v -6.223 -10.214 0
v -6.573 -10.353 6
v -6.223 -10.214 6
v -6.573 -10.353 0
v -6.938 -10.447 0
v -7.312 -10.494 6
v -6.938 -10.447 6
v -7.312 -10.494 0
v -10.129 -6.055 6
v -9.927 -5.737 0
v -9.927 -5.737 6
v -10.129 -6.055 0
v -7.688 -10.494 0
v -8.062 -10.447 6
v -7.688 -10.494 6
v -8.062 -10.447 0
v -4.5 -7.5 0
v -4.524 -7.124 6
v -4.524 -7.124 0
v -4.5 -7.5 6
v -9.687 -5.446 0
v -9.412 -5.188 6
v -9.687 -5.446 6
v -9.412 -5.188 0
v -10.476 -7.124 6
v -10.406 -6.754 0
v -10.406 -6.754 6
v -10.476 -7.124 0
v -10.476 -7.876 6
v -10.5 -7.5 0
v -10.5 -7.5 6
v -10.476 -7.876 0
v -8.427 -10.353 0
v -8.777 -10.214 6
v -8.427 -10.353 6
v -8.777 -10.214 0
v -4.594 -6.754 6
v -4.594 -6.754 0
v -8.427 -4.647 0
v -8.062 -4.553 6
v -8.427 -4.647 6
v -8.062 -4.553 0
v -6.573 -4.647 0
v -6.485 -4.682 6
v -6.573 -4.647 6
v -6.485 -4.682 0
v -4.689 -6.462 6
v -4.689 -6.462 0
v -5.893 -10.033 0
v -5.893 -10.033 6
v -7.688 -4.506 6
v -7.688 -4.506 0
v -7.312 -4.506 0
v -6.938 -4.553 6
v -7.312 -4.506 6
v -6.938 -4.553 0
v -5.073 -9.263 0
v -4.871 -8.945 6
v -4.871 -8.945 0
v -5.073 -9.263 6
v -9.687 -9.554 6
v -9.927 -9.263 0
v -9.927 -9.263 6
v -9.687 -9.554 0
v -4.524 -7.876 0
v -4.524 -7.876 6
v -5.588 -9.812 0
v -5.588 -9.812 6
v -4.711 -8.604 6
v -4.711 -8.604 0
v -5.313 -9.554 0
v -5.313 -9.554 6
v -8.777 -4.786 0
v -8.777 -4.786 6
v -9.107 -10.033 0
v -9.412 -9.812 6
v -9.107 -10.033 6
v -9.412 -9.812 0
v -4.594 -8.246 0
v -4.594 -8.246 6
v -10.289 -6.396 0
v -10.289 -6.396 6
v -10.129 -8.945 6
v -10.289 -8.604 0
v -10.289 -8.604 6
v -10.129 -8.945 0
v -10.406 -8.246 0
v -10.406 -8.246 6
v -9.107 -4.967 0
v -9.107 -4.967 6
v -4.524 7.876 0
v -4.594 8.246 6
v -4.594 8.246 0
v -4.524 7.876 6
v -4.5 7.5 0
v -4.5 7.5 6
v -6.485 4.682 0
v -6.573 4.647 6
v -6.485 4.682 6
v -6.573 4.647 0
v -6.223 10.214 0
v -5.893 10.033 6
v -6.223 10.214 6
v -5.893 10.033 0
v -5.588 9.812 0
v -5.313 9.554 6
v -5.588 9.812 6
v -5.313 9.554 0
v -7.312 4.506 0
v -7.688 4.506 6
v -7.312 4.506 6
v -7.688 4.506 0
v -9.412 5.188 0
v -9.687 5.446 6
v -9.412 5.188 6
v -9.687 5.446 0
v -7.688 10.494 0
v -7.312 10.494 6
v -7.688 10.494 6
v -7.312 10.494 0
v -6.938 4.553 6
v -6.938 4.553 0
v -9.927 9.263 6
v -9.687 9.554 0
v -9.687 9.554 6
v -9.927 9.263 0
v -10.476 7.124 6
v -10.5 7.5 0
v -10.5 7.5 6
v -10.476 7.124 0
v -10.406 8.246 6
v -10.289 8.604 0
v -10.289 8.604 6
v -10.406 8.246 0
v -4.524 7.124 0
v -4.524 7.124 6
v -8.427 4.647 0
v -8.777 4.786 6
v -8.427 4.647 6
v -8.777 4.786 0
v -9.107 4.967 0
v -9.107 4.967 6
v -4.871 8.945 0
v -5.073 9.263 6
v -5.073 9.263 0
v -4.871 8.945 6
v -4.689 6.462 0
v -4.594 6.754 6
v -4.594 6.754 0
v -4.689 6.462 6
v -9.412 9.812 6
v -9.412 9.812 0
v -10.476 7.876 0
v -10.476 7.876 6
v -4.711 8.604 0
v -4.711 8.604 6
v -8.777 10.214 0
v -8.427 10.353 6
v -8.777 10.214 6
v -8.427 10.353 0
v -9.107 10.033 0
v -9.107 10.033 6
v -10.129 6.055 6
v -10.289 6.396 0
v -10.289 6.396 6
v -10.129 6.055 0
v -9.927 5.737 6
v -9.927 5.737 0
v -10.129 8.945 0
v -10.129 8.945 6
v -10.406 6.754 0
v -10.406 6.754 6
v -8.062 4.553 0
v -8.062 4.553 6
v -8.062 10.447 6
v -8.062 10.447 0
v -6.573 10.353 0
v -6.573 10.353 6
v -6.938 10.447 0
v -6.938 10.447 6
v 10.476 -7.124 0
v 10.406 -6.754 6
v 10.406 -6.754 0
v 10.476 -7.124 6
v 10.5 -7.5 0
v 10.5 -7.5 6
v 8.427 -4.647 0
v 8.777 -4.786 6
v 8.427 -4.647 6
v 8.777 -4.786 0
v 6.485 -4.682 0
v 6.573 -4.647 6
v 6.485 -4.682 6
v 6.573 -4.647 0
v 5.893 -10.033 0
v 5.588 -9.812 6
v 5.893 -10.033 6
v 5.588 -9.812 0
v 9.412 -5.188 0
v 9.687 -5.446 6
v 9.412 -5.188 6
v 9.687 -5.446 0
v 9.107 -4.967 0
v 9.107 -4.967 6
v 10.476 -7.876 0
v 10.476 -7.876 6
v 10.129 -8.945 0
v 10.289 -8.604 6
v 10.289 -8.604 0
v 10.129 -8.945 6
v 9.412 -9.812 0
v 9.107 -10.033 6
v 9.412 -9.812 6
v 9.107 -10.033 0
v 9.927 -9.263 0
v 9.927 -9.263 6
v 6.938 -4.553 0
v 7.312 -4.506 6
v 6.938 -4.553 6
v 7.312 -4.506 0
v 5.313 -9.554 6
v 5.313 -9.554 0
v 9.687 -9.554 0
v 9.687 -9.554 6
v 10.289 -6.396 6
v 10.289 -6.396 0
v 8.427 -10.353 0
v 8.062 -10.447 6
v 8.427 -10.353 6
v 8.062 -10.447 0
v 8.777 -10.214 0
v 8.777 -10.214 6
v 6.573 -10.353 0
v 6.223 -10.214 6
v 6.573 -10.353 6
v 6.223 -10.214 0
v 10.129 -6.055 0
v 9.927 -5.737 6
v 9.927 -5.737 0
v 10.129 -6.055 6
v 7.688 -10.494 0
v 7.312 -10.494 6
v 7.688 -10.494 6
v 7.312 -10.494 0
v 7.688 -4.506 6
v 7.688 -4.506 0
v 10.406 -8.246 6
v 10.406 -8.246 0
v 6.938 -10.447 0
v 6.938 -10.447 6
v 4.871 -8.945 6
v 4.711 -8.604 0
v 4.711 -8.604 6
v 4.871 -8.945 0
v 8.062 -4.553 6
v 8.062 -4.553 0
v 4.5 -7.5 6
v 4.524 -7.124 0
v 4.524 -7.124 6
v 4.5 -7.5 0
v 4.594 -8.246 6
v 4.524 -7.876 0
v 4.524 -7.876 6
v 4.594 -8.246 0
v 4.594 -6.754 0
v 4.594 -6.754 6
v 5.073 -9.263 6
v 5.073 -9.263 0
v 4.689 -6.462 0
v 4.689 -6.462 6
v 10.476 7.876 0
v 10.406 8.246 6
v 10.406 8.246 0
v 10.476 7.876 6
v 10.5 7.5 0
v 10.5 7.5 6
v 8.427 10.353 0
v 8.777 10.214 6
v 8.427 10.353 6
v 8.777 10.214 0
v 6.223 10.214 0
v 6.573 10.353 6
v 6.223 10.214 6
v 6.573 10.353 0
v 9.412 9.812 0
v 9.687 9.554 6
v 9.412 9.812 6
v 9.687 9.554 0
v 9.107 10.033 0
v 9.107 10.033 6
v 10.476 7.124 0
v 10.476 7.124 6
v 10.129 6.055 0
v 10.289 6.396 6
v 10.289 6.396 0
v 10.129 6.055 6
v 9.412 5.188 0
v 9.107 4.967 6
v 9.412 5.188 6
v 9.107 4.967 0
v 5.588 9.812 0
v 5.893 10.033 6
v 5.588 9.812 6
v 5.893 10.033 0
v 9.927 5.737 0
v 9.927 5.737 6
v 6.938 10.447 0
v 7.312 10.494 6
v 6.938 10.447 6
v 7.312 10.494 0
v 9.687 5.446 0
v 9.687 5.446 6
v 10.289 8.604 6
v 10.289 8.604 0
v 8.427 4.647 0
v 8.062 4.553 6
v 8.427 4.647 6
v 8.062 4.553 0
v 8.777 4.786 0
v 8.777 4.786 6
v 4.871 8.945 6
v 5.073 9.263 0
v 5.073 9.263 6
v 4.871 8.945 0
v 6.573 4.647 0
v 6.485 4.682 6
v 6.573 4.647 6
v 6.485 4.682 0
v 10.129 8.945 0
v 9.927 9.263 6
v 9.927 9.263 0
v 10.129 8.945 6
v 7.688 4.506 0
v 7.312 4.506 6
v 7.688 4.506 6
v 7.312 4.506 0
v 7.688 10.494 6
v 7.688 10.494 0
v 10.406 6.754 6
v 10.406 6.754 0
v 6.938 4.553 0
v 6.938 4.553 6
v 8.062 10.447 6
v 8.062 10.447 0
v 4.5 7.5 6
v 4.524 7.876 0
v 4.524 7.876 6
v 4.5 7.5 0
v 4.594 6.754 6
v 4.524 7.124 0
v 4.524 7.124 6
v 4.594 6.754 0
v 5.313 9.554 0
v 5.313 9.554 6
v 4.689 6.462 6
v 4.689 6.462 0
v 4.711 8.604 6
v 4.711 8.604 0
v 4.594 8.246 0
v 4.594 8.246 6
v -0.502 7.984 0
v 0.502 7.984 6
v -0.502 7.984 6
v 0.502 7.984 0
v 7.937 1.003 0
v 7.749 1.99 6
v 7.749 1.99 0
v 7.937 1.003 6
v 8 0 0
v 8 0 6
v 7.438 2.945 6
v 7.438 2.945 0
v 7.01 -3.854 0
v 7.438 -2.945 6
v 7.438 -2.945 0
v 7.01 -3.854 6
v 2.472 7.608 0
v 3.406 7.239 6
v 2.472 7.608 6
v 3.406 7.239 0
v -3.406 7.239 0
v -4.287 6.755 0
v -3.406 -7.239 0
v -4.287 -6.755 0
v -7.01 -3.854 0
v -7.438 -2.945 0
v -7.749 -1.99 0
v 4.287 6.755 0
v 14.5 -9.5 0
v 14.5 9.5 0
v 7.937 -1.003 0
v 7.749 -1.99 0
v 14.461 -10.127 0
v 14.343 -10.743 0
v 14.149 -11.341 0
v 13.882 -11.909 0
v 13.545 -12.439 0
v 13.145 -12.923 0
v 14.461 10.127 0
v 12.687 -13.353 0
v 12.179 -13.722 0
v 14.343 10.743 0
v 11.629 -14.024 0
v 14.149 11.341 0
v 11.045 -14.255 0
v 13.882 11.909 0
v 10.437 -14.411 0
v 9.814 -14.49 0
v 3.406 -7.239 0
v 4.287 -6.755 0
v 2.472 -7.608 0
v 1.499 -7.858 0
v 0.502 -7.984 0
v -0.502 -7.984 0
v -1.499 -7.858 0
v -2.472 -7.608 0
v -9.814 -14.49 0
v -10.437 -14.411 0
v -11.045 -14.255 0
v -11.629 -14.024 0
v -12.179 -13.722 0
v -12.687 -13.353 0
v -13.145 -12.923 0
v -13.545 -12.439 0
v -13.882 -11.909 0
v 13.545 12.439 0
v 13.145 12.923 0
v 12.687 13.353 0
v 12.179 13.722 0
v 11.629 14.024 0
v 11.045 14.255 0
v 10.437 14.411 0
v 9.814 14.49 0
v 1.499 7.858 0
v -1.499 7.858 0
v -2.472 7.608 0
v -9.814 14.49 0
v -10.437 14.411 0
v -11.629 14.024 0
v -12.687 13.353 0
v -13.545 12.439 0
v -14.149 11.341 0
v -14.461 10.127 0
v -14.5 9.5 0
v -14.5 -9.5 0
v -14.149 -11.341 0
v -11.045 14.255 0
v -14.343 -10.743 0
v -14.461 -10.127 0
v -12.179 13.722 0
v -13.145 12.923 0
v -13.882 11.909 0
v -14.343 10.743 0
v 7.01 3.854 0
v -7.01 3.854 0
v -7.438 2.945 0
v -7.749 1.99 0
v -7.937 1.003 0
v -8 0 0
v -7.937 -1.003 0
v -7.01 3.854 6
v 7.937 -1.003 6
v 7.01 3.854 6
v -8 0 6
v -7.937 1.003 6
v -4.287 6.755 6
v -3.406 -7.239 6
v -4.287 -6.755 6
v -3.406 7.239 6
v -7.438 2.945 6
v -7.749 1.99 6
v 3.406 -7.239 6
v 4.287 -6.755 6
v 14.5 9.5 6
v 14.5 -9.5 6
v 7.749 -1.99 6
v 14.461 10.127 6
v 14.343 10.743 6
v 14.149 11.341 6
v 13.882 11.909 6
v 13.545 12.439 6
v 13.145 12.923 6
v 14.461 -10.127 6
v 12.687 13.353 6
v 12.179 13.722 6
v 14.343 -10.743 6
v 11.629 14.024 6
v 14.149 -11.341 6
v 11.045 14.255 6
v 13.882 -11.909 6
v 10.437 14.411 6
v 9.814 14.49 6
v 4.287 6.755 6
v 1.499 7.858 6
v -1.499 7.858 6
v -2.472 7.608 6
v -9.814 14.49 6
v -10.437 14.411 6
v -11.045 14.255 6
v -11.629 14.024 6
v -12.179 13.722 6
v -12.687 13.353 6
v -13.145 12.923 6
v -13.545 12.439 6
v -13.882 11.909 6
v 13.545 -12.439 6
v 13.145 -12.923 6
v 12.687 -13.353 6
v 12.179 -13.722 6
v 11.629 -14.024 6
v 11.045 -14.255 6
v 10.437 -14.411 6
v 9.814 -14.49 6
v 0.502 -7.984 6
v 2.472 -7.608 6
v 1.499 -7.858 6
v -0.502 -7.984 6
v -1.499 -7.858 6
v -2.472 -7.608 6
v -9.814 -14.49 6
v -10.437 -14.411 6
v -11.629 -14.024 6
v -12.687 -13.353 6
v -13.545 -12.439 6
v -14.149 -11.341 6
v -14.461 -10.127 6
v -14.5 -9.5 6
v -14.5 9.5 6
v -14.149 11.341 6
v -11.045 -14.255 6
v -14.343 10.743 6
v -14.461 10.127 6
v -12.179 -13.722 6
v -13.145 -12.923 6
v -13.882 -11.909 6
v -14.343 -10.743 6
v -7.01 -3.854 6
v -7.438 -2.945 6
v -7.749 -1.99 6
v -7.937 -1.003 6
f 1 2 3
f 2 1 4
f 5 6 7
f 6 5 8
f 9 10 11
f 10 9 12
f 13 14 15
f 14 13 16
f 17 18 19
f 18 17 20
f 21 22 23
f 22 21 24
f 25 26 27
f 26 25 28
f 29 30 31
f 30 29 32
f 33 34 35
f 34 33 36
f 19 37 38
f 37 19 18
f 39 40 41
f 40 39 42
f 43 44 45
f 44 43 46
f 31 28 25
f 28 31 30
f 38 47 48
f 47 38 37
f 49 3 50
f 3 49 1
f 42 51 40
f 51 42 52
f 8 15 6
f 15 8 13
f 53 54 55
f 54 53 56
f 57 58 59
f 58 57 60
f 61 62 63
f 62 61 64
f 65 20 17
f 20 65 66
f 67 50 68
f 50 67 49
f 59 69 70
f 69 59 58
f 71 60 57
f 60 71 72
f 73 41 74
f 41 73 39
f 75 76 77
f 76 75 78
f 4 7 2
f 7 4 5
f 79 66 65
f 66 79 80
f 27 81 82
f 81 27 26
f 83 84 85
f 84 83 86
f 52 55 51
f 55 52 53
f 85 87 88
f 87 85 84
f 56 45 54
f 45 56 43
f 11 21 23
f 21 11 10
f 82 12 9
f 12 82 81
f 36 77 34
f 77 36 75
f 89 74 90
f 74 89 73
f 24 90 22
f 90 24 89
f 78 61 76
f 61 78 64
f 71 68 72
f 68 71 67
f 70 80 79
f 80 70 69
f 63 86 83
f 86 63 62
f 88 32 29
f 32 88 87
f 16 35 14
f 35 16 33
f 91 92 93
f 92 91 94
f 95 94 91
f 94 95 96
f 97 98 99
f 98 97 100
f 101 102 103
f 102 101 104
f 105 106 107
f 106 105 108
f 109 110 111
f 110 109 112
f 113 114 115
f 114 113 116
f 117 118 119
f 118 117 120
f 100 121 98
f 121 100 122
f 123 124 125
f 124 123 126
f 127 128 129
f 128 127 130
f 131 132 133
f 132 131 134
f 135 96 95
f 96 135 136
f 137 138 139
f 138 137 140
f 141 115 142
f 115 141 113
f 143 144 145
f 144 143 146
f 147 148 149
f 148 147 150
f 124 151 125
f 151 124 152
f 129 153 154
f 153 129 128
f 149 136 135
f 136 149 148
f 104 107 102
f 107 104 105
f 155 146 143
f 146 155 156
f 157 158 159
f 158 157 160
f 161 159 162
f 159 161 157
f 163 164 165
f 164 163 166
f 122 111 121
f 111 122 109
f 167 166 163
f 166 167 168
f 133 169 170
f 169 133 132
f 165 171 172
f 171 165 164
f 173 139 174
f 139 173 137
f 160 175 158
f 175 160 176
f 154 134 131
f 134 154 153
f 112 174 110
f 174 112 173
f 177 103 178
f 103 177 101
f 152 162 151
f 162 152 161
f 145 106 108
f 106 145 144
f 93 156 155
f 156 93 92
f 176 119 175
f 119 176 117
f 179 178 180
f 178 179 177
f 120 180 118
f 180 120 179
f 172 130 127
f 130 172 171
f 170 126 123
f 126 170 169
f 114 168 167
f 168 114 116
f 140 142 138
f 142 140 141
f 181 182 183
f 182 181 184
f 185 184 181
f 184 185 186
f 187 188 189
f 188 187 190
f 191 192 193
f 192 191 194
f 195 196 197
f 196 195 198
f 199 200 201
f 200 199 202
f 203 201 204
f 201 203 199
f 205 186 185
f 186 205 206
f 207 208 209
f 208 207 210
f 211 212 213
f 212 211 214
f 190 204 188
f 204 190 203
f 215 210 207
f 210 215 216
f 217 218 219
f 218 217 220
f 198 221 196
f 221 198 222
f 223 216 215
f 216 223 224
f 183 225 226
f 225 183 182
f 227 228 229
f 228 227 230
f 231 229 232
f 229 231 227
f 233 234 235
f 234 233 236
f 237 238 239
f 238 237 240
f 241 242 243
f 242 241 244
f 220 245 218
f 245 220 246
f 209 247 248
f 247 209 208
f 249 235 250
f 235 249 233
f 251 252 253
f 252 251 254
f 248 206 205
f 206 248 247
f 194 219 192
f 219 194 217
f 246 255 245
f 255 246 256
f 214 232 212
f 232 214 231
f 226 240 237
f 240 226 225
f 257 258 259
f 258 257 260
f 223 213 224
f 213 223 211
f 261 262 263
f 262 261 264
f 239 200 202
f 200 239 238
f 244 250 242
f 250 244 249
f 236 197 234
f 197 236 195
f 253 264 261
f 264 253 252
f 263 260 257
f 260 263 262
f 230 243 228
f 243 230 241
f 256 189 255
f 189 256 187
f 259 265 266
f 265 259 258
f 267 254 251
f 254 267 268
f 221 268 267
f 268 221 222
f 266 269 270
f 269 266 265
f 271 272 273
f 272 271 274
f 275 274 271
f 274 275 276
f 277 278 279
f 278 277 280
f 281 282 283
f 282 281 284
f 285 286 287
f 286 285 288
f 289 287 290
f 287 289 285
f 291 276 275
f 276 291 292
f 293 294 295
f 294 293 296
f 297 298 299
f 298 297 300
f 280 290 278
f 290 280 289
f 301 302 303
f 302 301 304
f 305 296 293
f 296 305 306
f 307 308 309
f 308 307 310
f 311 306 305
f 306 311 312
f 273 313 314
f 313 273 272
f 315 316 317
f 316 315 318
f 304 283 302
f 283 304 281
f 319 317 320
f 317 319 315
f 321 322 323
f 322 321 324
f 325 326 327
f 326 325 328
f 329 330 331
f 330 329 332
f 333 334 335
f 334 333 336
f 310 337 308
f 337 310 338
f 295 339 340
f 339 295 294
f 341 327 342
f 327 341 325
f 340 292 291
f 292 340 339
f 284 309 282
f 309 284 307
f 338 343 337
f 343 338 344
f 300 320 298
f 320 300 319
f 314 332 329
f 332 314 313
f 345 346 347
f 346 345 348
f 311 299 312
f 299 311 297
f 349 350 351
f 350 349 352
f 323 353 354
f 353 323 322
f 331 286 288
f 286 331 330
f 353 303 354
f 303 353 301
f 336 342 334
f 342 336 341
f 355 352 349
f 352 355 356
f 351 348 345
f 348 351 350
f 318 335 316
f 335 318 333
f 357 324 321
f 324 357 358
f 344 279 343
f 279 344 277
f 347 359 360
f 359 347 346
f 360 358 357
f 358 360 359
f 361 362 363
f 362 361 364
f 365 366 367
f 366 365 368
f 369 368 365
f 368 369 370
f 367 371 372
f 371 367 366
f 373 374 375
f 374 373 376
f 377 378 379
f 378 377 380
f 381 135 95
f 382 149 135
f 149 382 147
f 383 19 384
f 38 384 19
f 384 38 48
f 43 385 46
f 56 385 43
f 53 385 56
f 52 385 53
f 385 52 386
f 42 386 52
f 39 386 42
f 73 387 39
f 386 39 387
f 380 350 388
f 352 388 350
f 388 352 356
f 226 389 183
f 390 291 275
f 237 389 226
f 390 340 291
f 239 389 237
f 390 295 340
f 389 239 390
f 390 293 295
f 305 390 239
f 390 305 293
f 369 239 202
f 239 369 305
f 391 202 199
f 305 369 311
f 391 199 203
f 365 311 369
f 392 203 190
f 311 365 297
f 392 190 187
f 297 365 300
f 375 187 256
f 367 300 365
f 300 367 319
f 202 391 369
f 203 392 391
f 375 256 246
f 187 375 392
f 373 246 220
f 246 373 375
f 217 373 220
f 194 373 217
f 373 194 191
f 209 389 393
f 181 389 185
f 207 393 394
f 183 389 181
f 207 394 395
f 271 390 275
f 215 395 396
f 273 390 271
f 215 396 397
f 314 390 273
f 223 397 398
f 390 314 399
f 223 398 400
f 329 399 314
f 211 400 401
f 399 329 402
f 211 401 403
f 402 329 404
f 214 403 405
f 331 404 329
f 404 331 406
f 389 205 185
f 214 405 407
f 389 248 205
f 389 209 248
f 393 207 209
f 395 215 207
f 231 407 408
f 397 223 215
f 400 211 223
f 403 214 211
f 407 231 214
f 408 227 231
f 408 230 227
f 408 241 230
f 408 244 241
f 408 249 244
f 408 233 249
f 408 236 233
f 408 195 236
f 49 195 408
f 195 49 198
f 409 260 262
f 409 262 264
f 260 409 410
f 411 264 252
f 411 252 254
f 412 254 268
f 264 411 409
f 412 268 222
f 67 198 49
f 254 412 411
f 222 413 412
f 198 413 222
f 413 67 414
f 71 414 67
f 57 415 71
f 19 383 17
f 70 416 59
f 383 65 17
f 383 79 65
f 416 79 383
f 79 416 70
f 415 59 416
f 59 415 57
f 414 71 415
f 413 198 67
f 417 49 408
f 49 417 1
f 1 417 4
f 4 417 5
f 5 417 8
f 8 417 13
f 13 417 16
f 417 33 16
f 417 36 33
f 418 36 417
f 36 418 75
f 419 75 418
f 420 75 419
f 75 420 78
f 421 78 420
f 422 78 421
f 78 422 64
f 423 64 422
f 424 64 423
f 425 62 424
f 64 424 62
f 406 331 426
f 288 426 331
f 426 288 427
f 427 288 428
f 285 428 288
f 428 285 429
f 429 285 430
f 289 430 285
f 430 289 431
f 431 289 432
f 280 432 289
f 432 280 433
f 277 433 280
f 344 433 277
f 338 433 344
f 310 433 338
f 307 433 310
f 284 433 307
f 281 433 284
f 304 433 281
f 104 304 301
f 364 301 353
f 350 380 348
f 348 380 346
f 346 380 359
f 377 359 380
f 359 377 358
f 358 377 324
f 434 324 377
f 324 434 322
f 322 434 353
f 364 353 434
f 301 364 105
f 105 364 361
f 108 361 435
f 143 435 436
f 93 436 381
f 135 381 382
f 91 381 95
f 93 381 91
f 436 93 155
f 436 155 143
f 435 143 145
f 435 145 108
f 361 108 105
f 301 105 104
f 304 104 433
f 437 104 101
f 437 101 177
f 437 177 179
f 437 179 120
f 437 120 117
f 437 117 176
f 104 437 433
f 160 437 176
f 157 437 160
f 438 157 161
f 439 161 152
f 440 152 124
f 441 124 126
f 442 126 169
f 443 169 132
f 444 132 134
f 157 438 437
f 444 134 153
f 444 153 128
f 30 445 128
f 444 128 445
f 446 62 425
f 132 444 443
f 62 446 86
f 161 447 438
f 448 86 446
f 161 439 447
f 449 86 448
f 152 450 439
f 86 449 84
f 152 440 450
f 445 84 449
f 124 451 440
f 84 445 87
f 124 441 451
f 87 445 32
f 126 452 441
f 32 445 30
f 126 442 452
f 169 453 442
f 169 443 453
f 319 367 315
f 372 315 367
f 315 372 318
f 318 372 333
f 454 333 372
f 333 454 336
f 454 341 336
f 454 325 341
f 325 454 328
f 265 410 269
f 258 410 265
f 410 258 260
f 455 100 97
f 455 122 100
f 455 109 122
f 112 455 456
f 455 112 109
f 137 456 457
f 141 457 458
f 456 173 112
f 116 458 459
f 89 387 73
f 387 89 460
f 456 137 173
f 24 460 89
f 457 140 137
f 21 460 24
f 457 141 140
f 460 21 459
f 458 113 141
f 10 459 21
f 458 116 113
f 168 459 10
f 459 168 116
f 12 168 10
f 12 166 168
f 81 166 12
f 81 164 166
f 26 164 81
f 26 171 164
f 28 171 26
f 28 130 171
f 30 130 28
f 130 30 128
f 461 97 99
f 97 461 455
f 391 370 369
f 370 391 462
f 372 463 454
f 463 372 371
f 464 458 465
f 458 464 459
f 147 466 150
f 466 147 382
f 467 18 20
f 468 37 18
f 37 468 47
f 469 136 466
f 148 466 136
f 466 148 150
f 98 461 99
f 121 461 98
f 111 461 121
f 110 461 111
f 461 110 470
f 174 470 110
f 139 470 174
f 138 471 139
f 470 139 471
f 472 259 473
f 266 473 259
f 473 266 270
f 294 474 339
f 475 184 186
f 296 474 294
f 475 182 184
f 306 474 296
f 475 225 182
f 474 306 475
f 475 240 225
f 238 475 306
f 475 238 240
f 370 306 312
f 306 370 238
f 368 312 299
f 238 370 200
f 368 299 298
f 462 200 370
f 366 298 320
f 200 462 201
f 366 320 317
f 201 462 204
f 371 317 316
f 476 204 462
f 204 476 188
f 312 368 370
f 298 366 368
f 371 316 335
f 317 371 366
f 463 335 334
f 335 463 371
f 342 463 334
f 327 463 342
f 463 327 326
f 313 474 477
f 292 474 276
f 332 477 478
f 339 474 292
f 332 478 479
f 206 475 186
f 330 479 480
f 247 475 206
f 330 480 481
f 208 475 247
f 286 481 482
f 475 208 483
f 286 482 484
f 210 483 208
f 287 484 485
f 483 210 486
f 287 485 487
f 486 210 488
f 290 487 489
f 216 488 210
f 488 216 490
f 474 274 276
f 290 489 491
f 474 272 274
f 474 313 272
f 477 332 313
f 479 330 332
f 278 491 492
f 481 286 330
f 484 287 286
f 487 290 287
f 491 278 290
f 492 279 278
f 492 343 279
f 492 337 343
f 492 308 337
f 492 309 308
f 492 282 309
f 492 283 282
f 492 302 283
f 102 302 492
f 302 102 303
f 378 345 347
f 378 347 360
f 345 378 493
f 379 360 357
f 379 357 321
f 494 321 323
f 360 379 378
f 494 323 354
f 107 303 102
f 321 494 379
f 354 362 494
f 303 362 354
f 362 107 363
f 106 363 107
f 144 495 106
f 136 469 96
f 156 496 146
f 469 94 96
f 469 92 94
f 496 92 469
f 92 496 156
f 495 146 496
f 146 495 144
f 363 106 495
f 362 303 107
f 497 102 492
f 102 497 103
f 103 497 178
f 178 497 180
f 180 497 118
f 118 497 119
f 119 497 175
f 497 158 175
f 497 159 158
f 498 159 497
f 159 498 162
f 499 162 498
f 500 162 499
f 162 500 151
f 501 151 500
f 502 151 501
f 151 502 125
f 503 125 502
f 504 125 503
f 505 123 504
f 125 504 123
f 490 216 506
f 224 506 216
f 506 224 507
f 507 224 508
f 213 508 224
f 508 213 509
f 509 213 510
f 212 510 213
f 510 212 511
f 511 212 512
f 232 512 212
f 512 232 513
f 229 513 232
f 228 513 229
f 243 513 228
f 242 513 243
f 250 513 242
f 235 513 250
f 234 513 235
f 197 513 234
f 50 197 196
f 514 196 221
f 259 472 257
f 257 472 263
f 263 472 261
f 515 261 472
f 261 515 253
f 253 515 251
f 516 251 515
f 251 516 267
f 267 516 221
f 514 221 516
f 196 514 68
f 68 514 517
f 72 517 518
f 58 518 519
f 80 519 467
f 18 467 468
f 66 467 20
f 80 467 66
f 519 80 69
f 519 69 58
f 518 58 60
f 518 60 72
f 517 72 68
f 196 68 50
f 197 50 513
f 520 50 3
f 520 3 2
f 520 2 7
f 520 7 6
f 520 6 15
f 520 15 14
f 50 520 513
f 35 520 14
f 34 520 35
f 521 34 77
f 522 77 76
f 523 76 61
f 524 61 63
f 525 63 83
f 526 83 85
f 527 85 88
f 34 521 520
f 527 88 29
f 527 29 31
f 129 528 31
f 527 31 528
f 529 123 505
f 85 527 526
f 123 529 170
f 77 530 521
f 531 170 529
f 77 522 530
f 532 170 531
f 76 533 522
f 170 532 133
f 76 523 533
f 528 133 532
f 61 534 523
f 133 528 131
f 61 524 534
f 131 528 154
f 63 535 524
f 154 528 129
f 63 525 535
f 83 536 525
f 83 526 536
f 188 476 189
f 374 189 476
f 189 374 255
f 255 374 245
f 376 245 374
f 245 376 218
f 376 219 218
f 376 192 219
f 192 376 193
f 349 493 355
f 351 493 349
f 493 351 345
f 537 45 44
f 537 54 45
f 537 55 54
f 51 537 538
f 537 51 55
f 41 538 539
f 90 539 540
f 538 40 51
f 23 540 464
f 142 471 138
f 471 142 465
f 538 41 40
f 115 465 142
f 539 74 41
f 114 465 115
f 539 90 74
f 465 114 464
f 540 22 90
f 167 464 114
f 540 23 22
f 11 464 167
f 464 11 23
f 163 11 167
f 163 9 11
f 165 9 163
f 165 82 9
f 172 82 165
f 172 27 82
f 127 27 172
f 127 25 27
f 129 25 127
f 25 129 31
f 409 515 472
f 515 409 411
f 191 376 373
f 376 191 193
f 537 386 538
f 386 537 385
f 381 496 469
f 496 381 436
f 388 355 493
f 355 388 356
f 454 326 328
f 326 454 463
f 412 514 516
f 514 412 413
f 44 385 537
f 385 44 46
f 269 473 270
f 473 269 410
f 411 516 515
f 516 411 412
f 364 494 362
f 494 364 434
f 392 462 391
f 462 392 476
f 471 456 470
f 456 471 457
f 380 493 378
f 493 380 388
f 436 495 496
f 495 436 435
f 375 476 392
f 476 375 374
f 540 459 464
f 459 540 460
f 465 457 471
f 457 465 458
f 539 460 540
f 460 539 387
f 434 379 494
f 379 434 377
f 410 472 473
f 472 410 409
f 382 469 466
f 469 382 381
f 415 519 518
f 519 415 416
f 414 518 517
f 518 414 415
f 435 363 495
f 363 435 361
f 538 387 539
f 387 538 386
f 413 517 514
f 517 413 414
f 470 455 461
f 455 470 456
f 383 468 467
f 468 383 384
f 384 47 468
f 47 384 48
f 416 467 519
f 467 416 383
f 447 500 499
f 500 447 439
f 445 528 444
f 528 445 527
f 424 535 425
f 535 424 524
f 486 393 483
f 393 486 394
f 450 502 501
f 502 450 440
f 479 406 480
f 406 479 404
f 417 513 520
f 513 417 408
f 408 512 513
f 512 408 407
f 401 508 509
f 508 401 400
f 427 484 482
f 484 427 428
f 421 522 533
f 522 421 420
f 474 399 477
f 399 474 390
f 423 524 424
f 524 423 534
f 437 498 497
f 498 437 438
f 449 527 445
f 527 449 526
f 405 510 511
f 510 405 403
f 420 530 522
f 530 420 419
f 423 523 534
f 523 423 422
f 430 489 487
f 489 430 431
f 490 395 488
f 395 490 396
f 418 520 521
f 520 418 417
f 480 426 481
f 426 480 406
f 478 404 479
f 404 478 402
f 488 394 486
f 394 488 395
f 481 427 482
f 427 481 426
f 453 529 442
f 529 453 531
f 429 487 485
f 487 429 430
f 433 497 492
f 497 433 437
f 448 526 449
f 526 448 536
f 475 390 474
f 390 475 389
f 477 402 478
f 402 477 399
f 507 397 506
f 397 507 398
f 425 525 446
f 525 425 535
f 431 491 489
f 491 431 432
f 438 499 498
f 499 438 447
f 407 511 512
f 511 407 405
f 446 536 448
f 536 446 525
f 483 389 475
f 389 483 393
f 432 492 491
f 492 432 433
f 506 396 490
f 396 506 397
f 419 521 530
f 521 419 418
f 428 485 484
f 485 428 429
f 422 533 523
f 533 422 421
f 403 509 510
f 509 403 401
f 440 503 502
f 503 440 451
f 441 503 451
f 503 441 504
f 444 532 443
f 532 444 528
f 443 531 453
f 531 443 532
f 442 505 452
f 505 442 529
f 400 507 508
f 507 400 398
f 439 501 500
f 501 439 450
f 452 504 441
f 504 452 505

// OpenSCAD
$fn = 50;


difference() {
	union() {
		hull() {
			translate(v = [-9.5000000000, 9.5000000000, 0]) {
				cylinder(h = 6, r = 5);
			}
			translate(v = [9.5000000000, 9.5000000000, 0]) {
				cylinder(h = 6, r = 5);
			}
			translate(v = [-9.5000000000, -9.5000000000, 0]) {
				cylinder(h = 6, r = 5);
			}
			translate(v = [9.5000000000, -9.5000000000, 0]) {
				cylinder(h = 6, r = 5);
			}
		}
	}
	union() {
		#translate(v = [-7.5000000000, -7.5000000000, -100.0000000000]) {
			cylinder(h = 200, r = 3.0000000000);
		}
		#translate(v = [-7.5000000000, 7.5000000000, -100.0000000000]) {
			cylinder(h = 200, r = 3.0000000000);
		}
		#translate(v = [7.5000000000, -7.5000000000, -100.0000000000]) {
			cylinder(h = 200, r = 3.0000000000);
		}
		#translate(v = [7.5000000000, 7.5000000000, -100.0000000000]) {
			cylinder(h = 200, r = 3.0000000000);
		}
		#cylinder(h = 6, r = 8.0000000000);
	}
}
